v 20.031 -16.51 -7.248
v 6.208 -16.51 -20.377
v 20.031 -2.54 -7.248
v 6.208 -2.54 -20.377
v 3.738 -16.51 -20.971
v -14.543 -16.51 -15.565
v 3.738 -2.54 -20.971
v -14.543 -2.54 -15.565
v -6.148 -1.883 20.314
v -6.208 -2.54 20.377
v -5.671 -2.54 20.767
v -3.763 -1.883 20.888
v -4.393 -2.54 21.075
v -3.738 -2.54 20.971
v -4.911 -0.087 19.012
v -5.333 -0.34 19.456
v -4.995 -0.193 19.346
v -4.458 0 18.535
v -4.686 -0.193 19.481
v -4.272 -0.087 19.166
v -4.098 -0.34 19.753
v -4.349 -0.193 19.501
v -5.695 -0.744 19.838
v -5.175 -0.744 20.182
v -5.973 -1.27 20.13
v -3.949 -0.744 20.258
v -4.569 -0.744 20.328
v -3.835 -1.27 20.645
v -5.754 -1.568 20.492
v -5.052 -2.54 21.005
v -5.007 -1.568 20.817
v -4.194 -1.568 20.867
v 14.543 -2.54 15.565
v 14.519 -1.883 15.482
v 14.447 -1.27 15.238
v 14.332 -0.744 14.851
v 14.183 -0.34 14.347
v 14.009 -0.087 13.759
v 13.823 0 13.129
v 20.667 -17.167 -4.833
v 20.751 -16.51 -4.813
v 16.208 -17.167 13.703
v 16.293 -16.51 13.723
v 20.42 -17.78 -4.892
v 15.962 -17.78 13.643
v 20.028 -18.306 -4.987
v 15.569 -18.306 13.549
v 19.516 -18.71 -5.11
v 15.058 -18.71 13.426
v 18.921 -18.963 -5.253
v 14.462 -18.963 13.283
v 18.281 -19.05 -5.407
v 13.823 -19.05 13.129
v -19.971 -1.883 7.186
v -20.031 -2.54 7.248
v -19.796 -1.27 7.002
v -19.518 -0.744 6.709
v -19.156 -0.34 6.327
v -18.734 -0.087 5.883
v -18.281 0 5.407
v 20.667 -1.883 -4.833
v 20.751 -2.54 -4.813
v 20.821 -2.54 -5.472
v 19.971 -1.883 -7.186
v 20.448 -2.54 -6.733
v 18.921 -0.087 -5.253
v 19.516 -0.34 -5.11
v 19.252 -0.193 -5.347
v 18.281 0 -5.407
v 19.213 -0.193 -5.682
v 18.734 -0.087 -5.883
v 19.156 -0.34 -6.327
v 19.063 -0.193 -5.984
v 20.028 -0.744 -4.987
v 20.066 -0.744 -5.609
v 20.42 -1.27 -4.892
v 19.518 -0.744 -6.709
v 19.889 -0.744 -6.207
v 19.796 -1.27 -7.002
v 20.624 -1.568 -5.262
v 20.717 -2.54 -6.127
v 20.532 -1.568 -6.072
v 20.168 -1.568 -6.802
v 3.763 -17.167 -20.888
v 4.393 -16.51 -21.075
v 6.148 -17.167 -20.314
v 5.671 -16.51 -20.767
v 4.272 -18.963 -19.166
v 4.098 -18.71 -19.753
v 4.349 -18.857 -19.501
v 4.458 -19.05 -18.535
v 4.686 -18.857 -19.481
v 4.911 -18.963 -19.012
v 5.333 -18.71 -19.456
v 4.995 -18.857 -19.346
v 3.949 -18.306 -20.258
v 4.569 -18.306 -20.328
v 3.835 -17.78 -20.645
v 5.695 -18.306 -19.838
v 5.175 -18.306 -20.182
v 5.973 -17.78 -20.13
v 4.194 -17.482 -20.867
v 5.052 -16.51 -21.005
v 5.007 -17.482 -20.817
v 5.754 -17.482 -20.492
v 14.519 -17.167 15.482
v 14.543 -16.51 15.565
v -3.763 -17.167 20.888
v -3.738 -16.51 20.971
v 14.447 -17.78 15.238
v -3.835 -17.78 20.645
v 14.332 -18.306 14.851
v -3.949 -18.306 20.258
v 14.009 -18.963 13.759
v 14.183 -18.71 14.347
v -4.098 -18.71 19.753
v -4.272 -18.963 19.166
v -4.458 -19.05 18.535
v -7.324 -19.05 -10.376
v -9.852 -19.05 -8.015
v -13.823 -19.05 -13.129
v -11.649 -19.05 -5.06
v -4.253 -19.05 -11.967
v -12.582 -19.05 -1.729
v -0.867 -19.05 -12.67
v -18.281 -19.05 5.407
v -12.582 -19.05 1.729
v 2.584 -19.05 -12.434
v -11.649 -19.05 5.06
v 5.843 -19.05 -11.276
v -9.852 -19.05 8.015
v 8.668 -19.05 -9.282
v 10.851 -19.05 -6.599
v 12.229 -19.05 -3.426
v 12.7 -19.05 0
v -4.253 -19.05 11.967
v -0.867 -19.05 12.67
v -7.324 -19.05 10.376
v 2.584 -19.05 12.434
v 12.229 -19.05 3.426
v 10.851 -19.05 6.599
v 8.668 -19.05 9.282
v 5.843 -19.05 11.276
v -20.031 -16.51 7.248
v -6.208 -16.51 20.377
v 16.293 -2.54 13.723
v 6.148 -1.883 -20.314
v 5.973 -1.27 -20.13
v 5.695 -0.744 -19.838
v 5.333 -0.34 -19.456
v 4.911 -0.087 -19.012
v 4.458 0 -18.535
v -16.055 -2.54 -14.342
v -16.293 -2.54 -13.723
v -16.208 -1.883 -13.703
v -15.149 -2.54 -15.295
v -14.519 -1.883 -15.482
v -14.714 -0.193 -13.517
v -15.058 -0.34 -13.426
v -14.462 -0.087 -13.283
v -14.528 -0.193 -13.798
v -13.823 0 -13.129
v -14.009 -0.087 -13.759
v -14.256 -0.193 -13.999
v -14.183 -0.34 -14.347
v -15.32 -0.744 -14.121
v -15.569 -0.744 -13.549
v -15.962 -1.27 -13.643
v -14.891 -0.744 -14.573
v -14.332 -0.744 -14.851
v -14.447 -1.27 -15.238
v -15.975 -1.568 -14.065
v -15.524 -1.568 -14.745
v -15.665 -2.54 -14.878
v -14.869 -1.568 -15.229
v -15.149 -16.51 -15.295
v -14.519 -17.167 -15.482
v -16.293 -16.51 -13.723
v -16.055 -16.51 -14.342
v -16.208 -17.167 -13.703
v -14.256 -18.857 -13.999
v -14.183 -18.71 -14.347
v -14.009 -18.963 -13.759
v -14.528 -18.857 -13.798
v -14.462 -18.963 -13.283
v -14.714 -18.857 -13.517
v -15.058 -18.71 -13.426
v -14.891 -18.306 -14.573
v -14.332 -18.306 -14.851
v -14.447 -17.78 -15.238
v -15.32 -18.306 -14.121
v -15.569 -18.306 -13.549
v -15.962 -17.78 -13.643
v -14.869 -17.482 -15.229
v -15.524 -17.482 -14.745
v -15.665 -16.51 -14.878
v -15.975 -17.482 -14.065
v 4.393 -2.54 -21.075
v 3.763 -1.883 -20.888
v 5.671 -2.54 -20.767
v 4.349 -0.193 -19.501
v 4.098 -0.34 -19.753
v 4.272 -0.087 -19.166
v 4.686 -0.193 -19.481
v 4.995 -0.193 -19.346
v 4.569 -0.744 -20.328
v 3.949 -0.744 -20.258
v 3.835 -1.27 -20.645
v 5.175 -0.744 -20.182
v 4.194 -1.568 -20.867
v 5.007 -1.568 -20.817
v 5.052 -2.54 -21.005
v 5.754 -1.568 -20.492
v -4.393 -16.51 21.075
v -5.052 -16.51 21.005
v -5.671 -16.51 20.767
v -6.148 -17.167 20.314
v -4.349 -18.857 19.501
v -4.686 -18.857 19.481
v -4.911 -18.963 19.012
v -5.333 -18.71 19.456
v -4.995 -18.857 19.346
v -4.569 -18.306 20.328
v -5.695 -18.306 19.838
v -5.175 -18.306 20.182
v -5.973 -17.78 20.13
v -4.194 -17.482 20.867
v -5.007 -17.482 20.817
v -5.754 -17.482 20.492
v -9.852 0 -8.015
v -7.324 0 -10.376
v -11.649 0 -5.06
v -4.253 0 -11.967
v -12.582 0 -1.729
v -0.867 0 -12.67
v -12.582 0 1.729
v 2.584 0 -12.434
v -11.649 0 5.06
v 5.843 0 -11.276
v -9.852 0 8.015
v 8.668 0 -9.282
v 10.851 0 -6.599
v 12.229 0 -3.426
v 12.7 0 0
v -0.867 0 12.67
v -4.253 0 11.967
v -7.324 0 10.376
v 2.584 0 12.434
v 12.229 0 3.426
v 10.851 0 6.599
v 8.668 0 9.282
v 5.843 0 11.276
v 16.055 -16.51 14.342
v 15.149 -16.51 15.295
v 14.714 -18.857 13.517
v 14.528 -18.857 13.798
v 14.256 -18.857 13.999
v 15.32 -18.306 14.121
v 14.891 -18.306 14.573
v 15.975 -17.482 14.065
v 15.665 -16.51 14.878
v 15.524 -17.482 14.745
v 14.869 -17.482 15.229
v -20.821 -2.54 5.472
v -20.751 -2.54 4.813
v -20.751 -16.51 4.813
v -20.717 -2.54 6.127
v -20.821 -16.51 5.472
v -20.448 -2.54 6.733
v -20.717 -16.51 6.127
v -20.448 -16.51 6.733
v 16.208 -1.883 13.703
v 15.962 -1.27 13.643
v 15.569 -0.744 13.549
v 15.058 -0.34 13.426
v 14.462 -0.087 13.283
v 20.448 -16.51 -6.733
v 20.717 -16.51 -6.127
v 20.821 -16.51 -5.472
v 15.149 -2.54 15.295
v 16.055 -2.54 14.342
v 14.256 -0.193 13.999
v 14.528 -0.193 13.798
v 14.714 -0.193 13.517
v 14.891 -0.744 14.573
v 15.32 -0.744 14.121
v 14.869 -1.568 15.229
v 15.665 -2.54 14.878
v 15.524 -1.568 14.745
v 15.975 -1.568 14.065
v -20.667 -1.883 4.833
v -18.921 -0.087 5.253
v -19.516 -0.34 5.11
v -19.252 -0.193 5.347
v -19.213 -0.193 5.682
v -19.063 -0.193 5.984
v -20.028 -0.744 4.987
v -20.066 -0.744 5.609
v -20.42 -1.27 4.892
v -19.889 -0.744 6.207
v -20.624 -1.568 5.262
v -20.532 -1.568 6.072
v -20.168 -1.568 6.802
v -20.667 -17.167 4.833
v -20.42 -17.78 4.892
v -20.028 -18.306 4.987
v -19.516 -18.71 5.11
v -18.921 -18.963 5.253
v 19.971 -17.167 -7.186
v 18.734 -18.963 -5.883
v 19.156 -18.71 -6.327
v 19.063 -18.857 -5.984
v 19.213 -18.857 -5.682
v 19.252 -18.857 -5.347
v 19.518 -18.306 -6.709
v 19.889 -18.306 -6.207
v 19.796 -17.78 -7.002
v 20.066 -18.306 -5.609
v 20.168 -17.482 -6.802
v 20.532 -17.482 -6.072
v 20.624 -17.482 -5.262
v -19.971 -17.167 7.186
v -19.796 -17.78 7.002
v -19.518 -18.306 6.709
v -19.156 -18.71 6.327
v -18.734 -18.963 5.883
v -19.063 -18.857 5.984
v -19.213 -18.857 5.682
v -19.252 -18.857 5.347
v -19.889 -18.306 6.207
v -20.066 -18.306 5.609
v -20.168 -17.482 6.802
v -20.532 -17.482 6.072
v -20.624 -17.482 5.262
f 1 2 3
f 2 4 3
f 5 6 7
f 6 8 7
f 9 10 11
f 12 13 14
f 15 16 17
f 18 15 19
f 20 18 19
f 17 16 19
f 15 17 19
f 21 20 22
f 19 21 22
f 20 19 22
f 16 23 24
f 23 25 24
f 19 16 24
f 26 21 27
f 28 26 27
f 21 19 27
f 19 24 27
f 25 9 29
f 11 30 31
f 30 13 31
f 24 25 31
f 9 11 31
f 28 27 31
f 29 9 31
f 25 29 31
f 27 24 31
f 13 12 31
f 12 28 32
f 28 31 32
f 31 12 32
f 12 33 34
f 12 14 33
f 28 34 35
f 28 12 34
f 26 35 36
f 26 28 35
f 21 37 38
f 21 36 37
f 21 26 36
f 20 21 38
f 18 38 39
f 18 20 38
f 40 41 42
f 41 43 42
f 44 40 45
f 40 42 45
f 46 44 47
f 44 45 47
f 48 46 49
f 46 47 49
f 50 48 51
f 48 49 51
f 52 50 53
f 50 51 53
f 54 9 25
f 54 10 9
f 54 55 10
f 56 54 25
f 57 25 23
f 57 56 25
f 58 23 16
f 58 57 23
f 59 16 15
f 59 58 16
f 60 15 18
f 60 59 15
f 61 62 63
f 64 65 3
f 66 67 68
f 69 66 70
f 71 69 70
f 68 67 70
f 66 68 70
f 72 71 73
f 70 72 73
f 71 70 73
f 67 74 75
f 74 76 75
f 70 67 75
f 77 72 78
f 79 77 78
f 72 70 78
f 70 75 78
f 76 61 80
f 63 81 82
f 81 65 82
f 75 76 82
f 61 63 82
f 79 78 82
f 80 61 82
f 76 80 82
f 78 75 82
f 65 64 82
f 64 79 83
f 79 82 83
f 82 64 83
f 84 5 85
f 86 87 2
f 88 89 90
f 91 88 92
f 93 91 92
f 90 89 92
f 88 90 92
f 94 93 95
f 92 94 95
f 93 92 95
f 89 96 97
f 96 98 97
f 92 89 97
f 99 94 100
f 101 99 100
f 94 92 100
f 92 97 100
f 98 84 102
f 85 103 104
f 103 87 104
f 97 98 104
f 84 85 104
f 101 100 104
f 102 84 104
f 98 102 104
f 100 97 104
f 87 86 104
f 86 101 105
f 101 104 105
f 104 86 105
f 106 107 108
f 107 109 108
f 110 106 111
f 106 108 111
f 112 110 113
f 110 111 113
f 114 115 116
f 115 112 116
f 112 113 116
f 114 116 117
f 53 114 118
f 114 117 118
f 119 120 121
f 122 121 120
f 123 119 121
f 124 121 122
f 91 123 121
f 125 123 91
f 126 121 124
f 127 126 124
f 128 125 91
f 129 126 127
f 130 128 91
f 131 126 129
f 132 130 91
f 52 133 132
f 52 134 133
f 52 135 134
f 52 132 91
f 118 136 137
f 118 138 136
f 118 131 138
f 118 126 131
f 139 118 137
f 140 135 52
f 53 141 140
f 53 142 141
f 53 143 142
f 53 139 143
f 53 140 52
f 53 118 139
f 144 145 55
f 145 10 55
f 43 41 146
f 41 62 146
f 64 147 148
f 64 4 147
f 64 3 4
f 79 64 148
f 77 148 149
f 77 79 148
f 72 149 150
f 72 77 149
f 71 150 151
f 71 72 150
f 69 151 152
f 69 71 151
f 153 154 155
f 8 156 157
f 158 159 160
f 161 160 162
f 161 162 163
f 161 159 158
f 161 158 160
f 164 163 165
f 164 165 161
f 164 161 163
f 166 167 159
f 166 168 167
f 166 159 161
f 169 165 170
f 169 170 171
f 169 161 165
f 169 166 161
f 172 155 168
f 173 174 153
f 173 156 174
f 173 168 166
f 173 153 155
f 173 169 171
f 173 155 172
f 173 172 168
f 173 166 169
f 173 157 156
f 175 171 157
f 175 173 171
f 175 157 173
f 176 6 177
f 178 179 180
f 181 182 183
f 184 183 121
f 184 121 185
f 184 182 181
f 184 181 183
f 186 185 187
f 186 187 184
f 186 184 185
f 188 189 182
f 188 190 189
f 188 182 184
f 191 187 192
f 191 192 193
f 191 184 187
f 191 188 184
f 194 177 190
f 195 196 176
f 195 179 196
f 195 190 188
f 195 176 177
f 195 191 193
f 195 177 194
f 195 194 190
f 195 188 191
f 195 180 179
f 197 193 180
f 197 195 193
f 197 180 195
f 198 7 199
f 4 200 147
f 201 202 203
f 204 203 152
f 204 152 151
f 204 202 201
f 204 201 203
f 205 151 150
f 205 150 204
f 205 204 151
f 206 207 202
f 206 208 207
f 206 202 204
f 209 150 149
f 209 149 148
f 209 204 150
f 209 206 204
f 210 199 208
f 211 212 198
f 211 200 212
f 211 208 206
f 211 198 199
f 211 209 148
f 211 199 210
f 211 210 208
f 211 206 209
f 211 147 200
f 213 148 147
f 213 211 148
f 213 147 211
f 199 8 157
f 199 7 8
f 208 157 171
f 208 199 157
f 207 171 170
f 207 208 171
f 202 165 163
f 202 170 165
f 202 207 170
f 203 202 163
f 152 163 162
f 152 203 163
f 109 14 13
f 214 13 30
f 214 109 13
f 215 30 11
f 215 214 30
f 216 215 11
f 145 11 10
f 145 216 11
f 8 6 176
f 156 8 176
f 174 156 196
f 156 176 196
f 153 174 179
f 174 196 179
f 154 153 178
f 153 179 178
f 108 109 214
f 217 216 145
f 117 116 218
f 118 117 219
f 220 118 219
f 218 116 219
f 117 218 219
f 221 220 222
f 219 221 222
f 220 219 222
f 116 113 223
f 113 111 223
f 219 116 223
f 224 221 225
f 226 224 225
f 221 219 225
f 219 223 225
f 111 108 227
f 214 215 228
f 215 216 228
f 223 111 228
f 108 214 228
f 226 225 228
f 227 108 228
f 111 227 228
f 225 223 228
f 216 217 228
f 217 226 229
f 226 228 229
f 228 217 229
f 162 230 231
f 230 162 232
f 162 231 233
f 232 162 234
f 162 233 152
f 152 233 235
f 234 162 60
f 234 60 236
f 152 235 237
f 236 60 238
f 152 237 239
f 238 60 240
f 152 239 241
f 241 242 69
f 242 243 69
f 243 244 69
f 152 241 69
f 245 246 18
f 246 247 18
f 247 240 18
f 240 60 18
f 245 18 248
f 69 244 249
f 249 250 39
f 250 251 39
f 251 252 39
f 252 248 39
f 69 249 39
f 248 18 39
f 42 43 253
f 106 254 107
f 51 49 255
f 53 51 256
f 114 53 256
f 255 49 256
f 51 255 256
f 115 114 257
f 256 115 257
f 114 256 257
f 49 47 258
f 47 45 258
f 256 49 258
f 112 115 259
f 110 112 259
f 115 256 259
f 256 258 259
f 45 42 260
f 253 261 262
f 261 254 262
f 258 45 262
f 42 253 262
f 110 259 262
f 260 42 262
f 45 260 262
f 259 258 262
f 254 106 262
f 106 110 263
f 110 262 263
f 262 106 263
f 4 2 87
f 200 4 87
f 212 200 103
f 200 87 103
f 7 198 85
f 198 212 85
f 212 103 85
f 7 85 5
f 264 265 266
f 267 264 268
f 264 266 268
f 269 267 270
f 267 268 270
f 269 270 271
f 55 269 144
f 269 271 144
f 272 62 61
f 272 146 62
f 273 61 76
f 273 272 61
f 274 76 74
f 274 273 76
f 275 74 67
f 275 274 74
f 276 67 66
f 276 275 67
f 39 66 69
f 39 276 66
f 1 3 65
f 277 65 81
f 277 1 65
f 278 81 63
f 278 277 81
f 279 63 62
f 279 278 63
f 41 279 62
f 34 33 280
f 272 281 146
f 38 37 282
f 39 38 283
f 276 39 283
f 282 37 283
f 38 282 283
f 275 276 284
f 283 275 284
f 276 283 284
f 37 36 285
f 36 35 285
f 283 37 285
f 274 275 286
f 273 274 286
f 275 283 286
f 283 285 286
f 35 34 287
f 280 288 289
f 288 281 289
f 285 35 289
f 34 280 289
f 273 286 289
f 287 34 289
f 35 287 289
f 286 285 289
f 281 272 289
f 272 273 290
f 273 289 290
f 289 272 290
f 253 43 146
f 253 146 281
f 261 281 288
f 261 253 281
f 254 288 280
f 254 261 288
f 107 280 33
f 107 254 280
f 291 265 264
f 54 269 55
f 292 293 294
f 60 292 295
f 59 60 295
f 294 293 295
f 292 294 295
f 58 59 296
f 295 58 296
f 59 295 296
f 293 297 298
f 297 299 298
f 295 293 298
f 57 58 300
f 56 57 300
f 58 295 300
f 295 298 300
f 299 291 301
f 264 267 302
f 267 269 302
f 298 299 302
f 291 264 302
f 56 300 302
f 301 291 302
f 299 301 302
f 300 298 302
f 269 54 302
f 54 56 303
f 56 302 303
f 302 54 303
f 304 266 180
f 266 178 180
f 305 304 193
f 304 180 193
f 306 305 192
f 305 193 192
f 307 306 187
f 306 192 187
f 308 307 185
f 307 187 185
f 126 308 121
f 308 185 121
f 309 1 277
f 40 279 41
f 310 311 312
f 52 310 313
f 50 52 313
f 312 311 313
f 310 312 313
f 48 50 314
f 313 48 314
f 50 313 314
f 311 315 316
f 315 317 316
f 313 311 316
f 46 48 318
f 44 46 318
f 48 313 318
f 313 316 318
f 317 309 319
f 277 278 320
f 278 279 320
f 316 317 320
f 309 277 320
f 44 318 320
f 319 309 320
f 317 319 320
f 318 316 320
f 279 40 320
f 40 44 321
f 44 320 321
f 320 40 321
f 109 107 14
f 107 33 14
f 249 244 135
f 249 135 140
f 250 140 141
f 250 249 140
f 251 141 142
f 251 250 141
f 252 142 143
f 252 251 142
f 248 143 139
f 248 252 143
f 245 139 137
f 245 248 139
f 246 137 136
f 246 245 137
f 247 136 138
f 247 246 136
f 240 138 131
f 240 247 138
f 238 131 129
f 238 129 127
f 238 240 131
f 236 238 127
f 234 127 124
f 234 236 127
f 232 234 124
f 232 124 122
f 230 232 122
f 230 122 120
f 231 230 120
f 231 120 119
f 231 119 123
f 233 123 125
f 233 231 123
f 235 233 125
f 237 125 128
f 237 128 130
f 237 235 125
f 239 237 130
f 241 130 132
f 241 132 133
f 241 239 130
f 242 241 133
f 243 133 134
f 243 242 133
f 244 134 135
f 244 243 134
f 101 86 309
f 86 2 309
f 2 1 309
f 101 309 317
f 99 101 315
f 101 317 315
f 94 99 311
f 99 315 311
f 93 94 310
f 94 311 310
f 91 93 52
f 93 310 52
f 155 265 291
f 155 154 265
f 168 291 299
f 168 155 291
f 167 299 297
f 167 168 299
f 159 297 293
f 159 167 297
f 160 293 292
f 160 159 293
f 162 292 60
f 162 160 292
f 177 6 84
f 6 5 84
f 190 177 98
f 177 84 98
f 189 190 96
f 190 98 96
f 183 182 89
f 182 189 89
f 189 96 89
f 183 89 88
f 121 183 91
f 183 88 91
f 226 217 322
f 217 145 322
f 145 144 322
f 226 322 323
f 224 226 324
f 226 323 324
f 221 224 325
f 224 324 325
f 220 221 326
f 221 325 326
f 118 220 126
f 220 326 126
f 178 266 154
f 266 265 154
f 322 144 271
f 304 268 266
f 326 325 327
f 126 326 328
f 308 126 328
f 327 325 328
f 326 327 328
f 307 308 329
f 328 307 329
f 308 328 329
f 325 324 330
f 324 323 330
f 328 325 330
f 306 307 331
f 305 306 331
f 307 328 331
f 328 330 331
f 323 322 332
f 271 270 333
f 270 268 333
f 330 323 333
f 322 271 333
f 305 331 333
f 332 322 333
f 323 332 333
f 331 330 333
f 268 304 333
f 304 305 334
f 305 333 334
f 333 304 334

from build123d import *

# Parameters (mm, degrees)
F0_R     = 12.7
F1_DEPTH = 19.05
F2_R     = 2.54


with BuildPart() as f1:
    # F0 (on Front) → F1 (new body)
    with BuildSketch(Plane.XZ):
        Polygon((5.144296, -21.387057), (21.093883, -6.238438), (15.949587, 15.148619), (-5.144296, 21.387057), (-21.093883, 6.238438), (-15.949587, -15.148619), align=None)
        Circle(F0_R, mode=Mode.SUBTRACT)
    extrude(amount=F1_DEPTH)

    # F2
    f2_edges = [f1.edges().sort_by_distance(p)[0] for p in [
        (-5.402646, -19.05, -18.267838),
        (13.119089, -19.05, -13.812748),
        (18.521735, -19.05, 4.455091),
        (5.402646, -19.05, 18.267838),
        (-13.119089, -19.05, 13.812748),
        (-18.521735, -19.05, -4.455091),
        (-5.402646, 0, -18.267838),
        (-15.949587, -9.525, -15.148619),
        (-18.521735, 0, -4.455091),
        (-13.119089, 0, 13.812748),
        (5.402646, 0, 18.267838),
        (18.521735, 0, 4.455091),
        (13.119089, 0, -13.812748),
        (-21.093883, -9.525, 6.238438),
        (-5.144296, -9.525, 21.387057),
        (15.949587, -9.525, 15.148619),
        (21.093883, -9.525, -6.238438),
        (5.144296, -9.525, -21.387057),
    ]]
    fillet(f2_edges, radius=F2_R)


solid = f1.part
